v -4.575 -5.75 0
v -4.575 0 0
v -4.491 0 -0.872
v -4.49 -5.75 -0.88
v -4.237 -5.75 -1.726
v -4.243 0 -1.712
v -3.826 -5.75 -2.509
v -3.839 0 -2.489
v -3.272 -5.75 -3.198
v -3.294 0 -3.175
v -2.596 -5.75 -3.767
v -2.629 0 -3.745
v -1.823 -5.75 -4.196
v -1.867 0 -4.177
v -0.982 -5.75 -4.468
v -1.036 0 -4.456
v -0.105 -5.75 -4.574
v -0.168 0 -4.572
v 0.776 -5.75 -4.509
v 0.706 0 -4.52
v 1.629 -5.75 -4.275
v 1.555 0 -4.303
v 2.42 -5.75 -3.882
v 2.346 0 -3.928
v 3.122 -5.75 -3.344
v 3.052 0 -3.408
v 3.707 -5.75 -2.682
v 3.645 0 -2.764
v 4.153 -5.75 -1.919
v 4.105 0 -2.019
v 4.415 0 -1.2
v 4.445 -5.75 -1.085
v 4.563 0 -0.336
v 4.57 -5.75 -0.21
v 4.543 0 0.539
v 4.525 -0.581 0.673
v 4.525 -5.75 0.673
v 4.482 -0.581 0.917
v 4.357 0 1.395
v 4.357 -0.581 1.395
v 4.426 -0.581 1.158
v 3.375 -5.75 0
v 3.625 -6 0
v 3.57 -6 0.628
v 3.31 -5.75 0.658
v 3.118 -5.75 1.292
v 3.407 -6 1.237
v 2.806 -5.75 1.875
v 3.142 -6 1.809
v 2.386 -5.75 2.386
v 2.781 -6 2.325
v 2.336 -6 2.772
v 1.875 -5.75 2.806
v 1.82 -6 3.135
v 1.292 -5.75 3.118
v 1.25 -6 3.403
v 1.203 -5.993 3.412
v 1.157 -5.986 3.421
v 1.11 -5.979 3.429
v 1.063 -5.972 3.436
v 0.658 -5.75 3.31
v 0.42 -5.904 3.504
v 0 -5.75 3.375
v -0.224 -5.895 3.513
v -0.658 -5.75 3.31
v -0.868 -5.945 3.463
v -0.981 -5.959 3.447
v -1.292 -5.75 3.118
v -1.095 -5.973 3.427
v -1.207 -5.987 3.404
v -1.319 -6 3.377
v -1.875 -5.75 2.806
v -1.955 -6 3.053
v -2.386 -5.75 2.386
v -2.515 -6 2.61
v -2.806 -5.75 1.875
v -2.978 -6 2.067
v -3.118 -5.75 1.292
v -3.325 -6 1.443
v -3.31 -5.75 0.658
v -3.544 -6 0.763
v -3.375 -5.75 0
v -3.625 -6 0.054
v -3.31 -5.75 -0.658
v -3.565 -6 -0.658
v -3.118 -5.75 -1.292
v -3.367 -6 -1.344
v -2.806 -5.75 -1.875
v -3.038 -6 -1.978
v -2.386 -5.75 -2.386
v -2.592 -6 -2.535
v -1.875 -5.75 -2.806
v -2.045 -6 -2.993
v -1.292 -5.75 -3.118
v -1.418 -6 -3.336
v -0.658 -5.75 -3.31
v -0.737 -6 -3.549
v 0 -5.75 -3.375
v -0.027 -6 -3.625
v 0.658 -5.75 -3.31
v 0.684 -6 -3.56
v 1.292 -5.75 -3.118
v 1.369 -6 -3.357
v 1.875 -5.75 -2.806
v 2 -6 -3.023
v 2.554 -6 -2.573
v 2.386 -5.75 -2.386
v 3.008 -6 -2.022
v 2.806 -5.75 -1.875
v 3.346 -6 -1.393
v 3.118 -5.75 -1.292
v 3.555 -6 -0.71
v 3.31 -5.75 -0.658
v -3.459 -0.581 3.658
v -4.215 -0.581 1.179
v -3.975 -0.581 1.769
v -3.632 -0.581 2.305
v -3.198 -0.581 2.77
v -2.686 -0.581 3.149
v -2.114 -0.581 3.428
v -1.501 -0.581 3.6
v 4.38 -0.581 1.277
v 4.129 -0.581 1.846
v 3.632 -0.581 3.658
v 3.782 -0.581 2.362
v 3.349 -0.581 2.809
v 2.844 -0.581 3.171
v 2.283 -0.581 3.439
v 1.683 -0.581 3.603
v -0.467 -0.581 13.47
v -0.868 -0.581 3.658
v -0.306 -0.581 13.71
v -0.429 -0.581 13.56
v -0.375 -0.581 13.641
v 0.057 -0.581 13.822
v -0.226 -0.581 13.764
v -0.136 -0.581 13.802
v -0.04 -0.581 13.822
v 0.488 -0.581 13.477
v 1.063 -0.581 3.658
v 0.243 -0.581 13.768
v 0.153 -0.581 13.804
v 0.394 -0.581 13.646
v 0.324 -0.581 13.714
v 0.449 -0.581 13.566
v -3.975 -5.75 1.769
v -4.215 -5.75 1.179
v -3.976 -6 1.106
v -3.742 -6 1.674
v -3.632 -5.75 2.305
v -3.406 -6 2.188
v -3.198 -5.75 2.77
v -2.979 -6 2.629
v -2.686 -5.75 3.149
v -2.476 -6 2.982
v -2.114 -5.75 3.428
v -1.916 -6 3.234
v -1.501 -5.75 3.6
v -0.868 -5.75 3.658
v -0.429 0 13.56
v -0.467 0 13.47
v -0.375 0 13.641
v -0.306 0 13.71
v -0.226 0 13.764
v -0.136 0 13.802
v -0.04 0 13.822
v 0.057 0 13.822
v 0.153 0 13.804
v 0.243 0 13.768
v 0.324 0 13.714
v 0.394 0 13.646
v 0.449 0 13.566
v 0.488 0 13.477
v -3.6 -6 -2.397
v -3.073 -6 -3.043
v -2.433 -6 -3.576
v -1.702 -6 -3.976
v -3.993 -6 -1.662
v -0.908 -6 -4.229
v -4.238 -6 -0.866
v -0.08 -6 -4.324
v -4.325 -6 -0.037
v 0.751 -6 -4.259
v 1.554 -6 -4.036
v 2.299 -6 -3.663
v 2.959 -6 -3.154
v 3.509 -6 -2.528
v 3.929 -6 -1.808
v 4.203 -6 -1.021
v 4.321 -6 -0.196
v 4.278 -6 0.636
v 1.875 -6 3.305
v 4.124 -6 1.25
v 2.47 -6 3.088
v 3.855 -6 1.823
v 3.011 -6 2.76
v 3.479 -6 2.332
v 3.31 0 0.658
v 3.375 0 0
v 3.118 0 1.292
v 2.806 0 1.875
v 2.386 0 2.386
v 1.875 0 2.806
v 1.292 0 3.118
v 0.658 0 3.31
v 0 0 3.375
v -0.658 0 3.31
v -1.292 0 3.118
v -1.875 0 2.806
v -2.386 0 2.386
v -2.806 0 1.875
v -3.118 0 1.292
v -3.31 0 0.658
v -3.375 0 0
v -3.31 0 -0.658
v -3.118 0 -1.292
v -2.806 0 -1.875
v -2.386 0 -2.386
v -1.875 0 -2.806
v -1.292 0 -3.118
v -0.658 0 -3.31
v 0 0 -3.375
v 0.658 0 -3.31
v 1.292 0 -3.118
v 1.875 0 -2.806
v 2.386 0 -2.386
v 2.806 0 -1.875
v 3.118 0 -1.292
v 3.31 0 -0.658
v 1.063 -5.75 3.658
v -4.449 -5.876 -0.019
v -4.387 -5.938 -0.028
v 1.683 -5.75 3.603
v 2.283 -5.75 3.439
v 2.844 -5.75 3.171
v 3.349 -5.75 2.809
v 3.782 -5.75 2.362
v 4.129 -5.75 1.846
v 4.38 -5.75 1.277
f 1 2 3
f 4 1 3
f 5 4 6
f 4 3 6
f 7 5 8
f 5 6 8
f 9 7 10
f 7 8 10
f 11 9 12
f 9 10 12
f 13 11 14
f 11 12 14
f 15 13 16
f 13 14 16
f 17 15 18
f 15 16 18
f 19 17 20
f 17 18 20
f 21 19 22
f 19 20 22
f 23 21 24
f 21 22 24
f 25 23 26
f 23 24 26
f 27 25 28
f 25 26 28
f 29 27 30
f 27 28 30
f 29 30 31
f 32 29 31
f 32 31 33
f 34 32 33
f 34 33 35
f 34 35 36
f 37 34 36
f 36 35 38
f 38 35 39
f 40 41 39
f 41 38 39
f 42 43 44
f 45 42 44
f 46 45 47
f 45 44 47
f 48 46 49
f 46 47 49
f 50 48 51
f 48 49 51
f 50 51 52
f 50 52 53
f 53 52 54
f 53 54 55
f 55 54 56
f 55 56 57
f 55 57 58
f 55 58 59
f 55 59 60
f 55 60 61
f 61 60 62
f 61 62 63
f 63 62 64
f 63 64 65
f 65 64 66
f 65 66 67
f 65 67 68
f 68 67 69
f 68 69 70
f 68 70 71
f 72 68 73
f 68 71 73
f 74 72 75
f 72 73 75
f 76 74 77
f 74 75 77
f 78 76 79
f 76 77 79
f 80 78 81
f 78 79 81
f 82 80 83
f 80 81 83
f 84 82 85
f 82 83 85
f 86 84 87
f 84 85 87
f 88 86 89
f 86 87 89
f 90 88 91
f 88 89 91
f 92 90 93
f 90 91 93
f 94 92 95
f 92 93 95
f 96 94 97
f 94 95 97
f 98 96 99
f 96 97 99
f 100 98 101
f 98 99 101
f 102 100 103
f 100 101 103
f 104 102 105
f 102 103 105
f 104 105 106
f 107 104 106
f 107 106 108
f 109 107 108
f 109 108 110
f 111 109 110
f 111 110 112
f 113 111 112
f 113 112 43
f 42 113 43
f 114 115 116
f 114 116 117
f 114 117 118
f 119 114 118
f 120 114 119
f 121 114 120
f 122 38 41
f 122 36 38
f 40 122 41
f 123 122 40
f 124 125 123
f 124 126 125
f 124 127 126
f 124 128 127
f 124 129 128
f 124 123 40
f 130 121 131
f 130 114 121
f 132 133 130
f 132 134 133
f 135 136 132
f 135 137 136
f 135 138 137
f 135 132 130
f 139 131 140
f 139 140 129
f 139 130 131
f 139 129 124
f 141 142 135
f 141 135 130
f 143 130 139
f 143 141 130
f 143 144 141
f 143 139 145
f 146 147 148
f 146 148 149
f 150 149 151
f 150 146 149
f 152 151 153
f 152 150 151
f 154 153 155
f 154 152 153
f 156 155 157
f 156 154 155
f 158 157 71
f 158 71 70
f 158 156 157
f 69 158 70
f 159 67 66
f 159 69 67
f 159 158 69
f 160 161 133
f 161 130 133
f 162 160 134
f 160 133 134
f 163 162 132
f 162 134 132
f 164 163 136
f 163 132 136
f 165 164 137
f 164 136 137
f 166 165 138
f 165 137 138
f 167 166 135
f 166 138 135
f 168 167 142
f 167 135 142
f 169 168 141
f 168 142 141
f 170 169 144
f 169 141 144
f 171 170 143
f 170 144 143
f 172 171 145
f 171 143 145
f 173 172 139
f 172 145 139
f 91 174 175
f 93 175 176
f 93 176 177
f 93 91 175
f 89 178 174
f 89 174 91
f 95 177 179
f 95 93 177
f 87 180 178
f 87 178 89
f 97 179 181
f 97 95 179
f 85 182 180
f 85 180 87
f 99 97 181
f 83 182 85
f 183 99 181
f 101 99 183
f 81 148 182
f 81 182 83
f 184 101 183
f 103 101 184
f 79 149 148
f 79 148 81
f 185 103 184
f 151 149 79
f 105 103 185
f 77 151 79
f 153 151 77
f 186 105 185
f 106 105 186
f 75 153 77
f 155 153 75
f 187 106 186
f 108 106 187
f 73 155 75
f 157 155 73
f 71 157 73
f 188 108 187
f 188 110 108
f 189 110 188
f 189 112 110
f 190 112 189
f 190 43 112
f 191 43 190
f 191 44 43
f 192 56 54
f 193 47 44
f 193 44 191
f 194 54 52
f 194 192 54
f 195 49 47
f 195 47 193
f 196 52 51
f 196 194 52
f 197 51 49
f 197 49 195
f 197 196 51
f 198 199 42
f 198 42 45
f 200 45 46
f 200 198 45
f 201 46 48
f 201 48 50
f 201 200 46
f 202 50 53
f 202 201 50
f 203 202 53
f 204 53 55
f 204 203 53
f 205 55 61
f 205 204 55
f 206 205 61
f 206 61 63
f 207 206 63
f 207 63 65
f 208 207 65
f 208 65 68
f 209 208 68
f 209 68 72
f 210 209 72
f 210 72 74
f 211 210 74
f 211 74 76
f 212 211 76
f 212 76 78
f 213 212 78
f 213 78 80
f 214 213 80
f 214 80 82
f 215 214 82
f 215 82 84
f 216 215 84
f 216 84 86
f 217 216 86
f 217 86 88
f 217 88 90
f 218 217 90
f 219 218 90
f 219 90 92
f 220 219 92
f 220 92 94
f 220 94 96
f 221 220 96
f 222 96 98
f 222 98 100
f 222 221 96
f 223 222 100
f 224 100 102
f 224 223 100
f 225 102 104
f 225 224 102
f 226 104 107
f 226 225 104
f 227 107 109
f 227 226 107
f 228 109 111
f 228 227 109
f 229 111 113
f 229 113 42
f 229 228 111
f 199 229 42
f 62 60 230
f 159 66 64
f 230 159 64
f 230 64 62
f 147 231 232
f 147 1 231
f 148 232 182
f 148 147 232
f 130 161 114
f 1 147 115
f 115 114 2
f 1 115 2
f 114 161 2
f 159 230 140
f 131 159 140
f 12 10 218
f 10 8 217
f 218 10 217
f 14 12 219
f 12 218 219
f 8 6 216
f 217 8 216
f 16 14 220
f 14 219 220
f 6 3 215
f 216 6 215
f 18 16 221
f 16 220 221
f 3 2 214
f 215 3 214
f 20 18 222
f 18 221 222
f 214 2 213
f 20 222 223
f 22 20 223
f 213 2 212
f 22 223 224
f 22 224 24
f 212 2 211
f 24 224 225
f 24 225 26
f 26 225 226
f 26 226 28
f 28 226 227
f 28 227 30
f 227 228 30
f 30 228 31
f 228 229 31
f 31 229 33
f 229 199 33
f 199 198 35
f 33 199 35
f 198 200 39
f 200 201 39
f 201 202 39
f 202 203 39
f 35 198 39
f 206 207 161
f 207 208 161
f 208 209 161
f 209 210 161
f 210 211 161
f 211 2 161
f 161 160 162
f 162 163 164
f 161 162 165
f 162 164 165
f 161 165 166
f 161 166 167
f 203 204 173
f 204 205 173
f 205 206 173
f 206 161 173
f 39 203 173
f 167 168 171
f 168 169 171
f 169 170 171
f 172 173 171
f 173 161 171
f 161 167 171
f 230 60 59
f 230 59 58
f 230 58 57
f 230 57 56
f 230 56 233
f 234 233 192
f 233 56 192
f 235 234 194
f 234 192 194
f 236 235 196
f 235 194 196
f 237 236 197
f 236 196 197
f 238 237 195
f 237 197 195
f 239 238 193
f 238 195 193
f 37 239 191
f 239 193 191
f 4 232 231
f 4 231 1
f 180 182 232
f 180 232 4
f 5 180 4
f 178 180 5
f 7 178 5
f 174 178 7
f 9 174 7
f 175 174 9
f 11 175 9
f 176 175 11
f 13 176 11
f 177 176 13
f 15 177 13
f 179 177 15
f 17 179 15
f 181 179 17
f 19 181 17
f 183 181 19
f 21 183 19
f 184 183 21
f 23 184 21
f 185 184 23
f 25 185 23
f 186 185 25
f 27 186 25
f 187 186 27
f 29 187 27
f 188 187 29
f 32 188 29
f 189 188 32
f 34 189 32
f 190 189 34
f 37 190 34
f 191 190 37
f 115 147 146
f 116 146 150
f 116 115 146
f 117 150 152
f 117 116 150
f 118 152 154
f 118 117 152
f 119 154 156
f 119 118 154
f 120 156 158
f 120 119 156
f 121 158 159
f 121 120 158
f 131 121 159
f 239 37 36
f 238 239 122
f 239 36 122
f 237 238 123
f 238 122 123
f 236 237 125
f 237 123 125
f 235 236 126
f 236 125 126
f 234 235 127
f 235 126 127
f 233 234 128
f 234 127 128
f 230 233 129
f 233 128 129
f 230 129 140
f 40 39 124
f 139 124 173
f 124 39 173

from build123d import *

# Parameters (mm, degrees)
F0_R          = 3.375
F1_DEPTH      = 6
F2_W          = 8.3882776671
F2_H          = 17.9039358627
F3_DEPTH      = 4.576
F3_DEPTH_BACK = 25
F4_T1_DEPTH   = 13.2089304981
F4_T3_DEPTH   = 11.8980683562
F5_R          = 0.5
F6_T1_DEPTH   = 1.9309283779
F6_T3_DEPTH   = 2.3257264643
F6_T8_ANGLE   = 73.0382941175
F6_T10_ANGLE  = 81.5443380081
F6_T12_ANGLE  = 196.5215831172


# Not quite as in the source:
# - a fillet or chamfer that OpenCascade refuses, or shapes differently, is made with other operations: its cross-section is extruded or revolved along the edge and cut away or added


with BuildPart() as f1:
    # F0 (on Front) → F1 (new body)
    with BuildSketch(Plane.XZ):
        with BuildLine():
            Line((0, 15), (-4.575, 0))
            ThreePointArc((-4.575, 0), (0.7061497994, -4.5201744945), (4.3570120047, 1.395375))
            Line((4.3570120047, 1.395375), (0, 15))
        make_face()
        Circle(F0_R, mode=Mode.SUBTRACT)
    extrude(amount=F1_DEPTH)

    # F2 (on Right) → F3 (cut, two sides)
    with BuildSketch(Plane.YZ) as f3_sk:
        with Locations((-4.7752561222, 12.6100402558)):
            Rectangle(F2_W, F2_H)
    extrude(amount=-F3_DEPTH, mode=Mode.SUBTRACT)
    extrude(f3_sk.sketch, amount=F3_DEPTH_BACK, mode=Mode.SUBTRACT)

    # F4: fillet of radius 3.5 on 2 edges, made by hand

    # F4_s2 → F4_t1 (cut)
    with BuildSketch(Plane.XZ.offset(0.5811172887)):
        with BuildLine():
            ThreePointArc((4.5252695152, 0.6727264041), (3.3489995726, 2.8086655863), (1.0633146948, 3.6580723245))
            Line((1.0633146948, 3.6580723245), (1.0633146948, 4.0080723245))
            Line((1.0633146948, 4.0080723245), (3.6323614241, 4.0080723245))
            Line((3.6323614241, 4.0080723245), (3.9656847468, 3.7648223245))
            ThreePointArc((3.9656847468, 3.7648223245), (4.6903353275, 1.502125), (4.8714649972, 0.7241918121))
            Line((4.8714649972, 0.7241918121), (4.5252695152, 0.6727264041))
        make_face()
    extrude(amount=F4_T1_DEPTH, mode=Mode.SUBTRACT)

    # F4_s4 → F4_t3 (cut)
    with BuildSketch(Plane.XZ.offset(0.5811172887)):
        with BuildLine():
            ThreePointArc((-4.2153635131, 1.1791360226), (-2.9504335333, 2.9708754587), (-0.8676136831, 3.6580723245))
            Line((-0.8676136831, 3.6580723245), (-3.459287941, 3.6580723245))
            Line((-3.459287941, 3.6580723245), (-4.2153635131, 1.1791360226))
        make_face()
    extrude(amount=F4_T3_DEPTH, mode=Mode.SUBTRACT)

    # F5
    f5_edges = [f1.edges().sort_by_distance(p)[0] for p in [
        (0, -0.290559, 15),
    ]]
    fillet(f5_edges, radius=F5_R)

    # F6: chamfer of 0.25 on 6 edges, made by hand

    # F6_s2 → F6_t1 (cut)
    with BuildSketch(Plane.YZ.offset(-0.8676136831)):
        Polygon((-6, 3.4080723245), (-5.75, 3.6580723245), (-6, 3.6580723245), align=None)
    extrude(amount=F6_T1_DEPTH, mode=Mode.SUBTRACT)

    # F6_s4 → F6_t3 (cut)
    with BuildSketch(Plane(origin=(-0.0297318944, 0, -0.0974816211), x_dir=(0, 1, 0), z_dir=(-0.2917324852, 0, -0.9564999514))):
        Polygon((-5.75, -4.3759872778), (-6, -4.1259872778), (-6, -4.3759872778), align=None)
    extrude(amount=F6_T3_DEPTH, mode=Mode.SUBTRACT)

    # F6_s5 → F6_t6 (revolve, cut)
    with BuildSketch(Plane.XY):
        Polygon((3.375, -5.75), (3.625, -6), (3.375, -6), align=None)
    revolve(axis=Axis((0, -6, 0), (0, -1, 0)), mode=Mode.SUBTRACT)

    # F6_s7 → F6_t8 (revolve, cut)
    with BuildSketch(Plane(origin=(-0.0297318944, 0, -0.0974816209), x_dir=(0, 1, 0), z_dir=(-0.2917324851, 0, -0.9564999514))):
        Polygon((-6, -4.1259872778), (-5.75, -4.3759872778), (-6, -4.3759872778), align=None)
    revolve(axis=Axis((-0.8676136832, -6, 0.1580723246), (0, 1, 0)), revolution_arc=F6_T8_ANGLE, mode=Mode.SUBTRACT)

    # F6_s9 → F6_t10 (revolve, cut)
    with BuildSketch(Plane.YZ.offset(1.0633146948)):
        Polygon((-5.75, 3.6580723245), (-6, 3.4080723245), (-6, 3.6580723245), align=None)
    revolve(axis=Axis((1.0633146948, -6, 0.1580723245), (0, 1, 0)), revolution_arc=F6_T10_ANGLE, mode=Mode.SUBTRACT)

    # F6_s11 → F6_t12 (revolve, cut)
    with BuildSketch(Plane(origin=(0, 0, 0), x_dir=(0, 1, 0), z_dir=(0.1403123523, 0, 0.990107289))):
        Polygon((-5.75, 4.575), (-6, 4.325), (-6, 4.575), align=None)
    revolve(axis=Axis((0, -6, 0), (0, -1, 0)), revolution_arc=F6_T12_ANGLE, mode=Mode.SUBTRACT)


solid = f1.part
